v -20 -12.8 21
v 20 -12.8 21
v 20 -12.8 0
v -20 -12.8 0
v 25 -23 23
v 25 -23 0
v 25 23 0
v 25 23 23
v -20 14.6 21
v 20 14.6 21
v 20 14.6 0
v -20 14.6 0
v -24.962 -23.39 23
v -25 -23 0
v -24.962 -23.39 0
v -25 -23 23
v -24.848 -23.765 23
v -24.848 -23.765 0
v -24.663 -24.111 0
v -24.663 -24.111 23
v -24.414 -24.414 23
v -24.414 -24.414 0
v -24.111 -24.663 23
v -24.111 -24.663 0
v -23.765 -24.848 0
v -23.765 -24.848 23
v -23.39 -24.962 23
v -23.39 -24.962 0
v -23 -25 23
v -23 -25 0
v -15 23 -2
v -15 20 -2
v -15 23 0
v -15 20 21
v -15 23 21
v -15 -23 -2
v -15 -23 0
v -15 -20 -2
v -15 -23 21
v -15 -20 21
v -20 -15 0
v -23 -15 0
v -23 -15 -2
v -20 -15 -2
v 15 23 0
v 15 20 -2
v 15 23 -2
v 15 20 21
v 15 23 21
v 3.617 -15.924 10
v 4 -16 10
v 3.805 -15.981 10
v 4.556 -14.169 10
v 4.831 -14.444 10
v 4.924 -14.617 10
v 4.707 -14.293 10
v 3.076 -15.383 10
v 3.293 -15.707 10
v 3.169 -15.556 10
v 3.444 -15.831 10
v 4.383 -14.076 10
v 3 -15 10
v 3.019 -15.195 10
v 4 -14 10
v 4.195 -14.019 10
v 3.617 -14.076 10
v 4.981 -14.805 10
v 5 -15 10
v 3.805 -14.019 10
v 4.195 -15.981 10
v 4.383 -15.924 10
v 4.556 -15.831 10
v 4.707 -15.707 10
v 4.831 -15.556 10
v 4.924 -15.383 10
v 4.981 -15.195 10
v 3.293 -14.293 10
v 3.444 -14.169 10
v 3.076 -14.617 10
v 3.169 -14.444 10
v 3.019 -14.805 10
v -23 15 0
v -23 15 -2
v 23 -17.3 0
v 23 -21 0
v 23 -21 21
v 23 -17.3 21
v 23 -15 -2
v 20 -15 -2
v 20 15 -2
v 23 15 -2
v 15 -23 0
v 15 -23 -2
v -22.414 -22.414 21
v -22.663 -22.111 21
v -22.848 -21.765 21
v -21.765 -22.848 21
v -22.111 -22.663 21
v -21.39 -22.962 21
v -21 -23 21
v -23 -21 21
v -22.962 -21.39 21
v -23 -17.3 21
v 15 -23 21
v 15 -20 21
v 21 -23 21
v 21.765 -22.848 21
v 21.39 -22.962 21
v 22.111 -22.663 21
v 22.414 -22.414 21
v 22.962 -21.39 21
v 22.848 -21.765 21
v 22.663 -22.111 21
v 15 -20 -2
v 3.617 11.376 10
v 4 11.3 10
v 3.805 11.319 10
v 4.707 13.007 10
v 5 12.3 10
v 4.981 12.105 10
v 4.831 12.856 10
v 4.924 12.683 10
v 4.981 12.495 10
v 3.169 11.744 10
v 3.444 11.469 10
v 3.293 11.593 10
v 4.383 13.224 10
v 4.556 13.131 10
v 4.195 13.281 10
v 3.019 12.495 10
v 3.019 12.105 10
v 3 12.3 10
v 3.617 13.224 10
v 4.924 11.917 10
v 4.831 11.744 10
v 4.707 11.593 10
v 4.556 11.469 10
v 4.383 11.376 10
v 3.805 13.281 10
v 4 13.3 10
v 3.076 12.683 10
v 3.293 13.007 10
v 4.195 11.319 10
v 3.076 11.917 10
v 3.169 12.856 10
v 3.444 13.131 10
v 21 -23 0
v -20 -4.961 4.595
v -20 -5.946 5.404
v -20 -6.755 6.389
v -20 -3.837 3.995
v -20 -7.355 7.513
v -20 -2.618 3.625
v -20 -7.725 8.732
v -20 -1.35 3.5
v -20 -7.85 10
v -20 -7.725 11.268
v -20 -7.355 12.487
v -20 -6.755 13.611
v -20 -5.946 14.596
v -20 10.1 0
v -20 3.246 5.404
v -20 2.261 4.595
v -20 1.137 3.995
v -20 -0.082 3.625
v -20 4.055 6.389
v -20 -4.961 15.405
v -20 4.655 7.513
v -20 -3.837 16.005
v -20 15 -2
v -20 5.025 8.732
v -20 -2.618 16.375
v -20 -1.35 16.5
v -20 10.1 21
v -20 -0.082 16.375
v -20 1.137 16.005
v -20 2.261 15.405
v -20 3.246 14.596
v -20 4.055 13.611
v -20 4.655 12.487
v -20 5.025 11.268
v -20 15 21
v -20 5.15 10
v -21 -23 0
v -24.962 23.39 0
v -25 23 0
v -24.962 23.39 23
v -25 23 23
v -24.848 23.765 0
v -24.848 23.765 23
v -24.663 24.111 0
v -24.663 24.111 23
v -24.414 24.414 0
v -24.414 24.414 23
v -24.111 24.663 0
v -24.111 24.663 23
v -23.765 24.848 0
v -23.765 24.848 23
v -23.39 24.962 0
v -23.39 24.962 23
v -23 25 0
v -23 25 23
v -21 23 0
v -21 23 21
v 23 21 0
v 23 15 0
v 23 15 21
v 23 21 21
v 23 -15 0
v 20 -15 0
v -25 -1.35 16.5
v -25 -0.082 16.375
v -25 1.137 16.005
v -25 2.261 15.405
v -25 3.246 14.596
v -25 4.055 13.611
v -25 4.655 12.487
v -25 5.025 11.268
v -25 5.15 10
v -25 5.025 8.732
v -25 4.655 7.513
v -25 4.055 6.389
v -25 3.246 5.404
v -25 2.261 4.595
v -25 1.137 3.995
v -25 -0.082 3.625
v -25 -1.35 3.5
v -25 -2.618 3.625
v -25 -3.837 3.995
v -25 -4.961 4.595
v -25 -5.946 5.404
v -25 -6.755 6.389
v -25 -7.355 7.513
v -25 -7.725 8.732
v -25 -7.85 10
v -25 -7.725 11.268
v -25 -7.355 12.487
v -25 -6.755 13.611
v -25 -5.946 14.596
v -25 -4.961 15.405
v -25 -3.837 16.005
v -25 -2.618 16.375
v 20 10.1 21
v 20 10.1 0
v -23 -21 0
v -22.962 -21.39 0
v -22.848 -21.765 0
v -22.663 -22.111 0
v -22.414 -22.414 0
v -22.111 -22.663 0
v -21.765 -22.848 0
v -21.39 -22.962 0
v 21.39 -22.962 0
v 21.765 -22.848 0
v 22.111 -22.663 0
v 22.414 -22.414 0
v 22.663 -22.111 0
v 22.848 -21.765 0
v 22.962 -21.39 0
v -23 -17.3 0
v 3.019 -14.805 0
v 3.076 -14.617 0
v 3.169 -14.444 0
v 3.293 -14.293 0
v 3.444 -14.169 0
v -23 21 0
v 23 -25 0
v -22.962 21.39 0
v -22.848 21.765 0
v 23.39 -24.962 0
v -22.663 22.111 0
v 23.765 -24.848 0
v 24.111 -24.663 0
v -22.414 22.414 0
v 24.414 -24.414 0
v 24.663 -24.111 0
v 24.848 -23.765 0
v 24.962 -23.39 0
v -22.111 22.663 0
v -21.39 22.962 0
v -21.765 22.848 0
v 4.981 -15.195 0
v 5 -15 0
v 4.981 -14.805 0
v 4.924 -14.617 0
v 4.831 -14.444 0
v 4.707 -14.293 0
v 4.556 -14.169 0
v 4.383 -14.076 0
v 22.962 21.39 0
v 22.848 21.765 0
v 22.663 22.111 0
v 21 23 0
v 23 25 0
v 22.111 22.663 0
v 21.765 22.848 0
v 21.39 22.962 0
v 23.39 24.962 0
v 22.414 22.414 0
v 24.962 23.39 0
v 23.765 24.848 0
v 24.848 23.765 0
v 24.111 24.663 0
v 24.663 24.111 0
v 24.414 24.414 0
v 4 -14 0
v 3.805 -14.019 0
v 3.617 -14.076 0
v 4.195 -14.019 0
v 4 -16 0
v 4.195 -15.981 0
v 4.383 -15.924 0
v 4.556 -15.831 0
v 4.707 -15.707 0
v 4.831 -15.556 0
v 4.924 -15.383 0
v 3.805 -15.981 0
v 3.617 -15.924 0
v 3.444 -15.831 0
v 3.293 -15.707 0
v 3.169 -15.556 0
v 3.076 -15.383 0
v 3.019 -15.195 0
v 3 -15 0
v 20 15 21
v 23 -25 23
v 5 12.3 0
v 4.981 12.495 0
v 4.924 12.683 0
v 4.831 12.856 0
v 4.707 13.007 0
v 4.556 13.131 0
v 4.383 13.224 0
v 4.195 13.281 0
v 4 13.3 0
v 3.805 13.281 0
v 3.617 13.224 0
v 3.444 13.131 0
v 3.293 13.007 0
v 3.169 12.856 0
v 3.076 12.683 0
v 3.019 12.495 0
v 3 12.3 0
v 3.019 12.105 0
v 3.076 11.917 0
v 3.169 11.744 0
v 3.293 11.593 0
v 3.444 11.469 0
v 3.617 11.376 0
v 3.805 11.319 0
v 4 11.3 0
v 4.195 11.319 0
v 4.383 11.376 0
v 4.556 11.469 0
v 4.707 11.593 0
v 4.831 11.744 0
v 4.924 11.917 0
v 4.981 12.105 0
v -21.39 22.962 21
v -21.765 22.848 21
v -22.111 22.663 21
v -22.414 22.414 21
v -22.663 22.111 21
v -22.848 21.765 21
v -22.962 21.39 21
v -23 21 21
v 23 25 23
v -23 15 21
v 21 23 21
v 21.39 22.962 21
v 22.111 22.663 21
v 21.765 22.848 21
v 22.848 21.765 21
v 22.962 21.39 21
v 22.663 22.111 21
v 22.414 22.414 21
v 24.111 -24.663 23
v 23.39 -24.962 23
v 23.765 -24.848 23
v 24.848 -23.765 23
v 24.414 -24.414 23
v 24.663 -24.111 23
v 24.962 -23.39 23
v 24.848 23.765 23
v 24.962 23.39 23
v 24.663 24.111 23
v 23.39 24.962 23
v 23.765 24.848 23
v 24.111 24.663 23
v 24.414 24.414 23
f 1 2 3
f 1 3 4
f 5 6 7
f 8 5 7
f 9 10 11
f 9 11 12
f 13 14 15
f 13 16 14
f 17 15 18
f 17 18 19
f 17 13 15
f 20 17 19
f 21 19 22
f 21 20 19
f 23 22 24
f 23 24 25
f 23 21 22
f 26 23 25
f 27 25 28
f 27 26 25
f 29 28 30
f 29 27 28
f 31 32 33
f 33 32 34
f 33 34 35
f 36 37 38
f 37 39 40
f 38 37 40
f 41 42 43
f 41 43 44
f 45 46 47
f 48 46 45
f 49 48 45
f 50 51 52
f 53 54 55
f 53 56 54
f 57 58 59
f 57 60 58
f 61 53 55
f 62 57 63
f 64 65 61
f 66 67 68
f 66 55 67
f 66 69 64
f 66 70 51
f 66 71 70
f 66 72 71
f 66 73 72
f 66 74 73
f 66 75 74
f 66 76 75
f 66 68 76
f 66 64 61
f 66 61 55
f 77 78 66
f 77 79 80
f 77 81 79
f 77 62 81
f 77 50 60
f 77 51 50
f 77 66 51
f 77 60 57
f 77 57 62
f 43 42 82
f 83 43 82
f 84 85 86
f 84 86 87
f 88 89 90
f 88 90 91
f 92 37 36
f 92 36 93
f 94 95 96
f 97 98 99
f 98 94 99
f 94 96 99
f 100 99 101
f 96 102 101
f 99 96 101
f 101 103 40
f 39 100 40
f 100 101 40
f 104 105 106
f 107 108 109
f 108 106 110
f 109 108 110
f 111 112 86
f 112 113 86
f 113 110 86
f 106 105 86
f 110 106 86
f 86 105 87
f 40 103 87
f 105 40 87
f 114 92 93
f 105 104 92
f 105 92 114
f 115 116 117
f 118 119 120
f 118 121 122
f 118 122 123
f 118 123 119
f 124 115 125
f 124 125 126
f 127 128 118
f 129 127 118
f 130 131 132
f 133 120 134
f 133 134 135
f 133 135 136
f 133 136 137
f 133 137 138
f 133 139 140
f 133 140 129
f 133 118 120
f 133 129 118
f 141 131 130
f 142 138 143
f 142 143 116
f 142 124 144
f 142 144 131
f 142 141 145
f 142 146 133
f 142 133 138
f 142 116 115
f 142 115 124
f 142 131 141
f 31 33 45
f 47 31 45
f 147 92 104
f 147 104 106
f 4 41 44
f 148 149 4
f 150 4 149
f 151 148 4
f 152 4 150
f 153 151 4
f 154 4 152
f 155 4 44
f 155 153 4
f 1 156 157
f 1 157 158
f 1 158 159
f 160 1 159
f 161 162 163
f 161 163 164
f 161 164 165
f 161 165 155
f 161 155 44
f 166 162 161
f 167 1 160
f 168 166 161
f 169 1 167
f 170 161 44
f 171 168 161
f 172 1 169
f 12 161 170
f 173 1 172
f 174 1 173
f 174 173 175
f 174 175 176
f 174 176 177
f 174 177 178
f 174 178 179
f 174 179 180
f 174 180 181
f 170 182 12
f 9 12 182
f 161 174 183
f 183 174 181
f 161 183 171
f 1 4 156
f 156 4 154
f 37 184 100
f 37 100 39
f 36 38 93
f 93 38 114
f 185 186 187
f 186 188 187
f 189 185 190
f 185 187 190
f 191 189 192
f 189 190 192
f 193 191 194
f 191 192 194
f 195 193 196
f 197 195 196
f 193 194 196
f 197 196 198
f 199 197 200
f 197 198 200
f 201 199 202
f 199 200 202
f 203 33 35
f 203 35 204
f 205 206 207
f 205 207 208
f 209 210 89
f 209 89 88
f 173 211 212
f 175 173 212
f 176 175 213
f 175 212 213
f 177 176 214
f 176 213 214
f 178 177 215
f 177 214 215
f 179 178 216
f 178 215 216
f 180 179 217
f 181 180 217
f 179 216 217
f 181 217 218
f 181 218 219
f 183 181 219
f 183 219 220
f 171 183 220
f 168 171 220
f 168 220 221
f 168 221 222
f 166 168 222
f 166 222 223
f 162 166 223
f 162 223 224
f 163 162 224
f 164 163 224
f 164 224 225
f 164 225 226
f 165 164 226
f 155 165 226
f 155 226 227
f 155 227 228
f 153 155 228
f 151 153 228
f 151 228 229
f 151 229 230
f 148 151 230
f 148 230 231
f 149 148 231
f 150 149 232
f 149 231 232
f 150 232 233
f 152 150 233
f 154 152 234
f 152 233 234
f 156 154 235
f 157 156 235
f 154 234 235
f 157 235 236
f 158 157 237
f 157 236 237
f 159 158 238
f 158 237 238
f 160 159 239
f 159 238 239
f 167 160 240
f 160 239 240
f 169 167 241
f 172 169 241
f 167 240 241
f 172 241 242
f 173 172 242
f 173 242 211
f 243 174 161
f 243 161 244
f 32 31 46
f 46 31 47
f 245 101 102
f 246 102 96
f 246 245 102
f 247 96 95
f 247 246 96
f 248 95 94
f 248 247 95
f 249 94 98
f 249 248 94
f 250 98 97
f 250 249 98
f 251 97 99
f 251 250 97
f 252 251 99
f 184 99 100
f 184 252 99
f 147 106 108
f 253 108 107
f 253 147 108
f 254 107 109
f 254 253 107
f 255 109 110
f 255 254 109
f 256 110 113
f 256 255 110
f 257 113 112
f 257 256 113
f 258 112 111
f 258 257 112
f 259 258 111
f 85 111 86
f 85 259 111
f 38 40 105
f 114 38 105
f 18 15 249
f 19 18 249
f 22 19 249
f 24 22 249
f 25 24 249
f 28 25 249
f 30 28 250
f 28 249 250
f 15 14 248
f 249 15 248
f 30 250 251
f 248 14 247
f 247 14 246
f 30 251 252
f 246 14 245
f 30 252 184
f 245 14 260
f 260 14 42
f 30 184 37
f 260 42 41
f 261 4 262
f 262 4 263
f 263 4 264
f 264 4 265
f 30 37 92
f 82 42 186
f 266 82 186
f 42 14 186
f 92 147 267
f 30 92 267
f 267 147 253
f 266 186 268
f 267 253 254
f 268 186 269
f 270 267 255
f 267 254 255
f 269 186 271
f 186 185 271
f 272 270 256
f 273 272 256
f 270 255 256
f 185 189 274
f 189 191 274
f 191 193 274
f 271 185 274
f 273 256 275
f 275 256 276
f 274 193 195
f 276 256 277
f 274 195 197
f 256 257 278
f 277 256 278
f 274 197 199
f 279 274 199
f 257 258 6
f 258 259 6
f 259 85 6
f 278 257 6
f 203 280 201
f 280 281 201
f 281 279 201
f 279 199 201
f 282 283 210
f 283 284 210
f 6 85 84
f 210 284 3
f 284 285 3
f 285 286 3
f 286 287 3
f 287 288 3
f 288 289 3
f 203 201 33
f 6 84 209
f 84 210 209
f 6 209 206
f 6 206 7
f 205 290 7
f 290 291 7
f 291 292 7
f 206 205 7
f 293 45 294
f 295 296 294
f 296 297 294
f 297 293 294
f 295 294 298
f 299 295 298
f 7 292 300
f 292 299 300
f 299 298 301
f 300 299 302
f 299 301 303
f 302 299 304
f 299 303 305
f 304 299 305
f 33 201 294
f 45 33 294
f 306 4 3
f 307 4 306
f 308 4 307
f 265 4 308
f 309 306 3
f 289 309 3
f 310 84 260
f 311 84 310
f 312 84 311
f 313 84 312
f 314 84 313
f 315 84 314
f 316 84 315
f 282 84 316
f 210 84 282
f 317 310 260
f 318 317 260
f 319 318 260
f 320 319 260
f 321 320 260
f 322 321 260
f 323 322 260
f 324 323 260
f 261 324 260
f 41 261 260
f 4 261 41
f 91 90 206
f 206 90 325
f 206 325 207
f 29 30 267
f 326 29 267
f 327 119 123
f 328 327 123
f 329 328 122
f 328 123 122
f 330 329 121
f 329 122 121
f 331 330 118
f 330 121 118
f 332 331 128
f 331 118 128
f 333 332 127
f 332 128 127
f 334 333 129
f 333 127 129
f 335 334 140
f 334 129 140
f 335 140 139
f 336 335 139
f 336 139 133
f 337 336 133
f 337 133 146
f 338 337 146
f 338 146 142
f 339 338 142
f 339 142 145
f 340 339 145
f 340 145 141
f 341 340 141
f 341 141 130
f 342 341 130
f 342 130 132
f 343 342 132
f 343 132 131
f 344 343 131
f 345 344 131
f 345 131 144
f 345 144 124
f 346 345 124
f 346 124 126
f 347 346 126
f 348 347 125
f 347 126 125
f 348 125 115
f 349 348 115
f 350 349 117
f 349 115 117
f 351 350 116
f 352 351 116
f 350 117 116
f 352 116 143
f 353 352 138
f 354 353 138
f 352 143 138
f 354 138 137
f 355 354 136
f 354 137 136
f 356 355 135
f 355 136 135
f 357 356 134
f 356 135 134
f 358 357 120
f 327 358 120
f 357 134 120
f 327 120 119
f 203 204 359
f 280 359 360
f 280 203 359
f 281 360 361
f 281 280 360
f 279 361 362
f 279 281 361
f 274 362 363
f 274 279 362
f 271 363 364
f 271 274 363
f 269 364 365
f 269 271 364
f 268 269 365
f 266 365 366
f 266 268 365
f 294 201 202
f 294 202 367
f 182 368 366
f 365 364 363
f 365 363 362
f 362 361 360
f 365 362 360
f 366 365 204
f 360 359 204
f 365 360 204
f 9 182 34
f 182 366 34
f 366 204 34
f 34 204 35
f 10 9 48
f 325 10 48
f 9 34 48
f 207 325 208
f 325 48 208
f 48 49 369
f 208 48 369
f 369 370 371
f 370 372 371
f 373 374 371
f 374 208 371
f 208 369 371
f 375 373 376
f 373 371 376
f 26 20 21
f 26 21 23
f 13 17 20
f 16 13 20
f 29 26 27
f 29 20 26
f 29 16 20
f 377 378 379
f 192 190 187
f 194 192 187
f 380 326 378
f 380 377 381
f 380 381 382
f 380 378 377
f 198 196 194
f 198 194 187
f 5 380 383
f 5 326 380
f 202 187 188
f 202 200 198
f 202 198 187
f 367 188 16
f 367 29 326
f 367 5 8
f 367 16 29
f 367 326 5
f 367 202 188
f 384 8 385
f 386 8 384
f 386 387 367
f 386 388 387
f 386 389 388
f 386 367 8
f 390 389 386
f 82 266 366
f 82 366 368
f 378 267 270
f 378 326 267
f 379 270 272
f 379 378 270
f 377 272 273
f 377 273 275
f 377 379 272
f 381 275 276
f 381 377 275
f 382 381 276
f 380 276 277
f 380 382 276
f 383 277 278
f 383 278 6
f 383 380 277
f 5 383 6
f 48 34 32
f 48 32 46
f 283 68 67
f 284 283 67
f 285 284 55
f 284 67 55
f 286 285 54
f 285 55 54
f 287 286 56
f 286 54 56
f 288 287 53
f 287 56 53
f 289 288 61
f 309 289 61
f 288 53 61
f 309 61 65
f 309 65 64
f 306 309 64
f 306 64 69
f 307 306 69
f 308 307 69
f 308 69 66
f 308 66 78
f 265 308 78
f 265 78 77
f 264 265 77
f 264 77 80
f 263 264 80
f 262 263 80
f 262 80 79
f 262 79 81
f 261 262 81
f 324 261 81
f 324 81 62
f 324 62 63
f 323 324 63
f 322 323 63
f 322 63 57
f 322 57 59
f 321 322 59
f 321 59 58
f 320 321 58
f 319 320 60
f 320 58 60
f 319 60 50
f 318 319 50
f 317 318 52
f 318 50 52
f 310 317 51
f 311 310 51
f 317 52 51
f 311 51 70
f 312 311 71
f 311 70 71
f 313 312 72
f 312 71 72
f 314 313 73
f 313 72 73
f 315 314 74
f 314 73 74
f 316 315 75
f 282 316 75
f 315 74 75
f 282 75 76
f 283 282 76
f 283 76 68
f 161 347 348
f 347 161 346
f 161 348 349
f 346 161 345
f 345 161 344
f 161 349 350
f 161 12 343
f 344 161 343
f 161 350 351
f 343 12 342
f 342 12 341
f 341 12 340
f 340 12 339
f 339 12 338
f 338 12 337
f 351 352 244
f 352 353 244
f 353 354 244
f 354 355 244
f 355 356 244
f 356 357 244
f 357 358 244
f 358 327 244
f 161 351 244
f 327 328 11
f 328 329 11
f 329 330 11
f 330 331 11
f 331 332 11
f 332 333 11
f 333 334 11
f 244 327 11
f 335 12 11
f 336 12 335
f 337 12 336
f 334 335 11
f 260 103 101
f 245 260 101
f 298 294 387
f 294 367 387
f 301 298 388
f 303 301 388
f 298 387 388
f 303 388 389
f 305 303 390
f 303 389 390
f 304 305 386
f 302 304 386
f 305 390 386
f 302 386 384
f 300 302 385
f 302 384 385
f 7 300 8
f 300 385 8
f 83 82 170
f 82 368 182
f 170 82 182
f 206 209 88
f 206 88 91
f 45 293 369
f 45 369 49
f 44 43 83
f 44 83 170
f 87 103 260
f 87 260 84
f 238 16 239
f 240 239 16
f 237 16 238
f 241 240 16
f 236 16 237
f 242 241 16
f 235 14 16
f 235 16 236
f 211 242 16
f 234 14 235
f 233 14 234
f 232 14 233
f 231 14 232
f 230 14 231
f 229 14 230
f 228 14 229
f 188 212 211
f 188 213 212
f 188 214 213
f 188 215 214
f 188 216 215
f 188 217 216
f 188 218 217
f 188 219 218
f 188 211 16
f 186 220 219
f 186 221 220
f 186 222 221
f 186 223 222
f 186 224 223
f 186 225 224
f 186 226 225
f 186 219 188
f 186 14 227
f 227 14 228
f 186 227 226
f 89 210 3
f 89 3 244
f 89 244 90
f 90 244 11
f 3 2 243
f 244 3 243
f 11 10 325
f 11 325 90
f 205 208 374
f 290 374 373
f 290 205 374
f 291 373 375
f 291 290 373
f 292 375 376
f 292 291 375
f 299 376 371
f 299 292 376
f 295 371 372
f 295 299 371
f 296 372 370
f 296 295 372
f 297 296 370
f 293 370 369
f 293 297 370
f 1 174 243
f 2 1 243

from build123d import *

# Parameters (mm, degrees)
SZKIC1_W                           = 30
SZKIC1_H                           = 3
DODANIE_WYCI_GNI_CIE1_DEPTH        = 23
DODANIE_WYCI_GNI_CIE1_DEPTH_BACK   = 2
SZKIC1_W_2                         = 3
SZKIC1_H_2                         = 30
DODANIE_WYCI_GNI_CIE1_2_DEPTH      = 23
DODANIE_WYCI_GNI_CIE1_2_DEPTH_BACK = 2
DODANIE_WYCI_GNI_CIE1_3_DEPTH      = 23
DODANIE_WYCI_GNI_CIE1_3_DEPTH_BACK = 2
DODANIE_WYCI_GNI_CIE1_4_DEPTH      = 23
DODANIE_WYCI_GNI_CIE1_4_DEPTH_BACK = 2
SZKIC2_W                           = 50
SZKIC2_H                           = 50
DODANIE_WYCI_GNI_CIE2_DEPTH        = 23
SZKIC3_W                           = 11.8
SZKIC3_H                           = 4.5
SZKIC3_R                           = 1
SZKIC3_W_2                         = 10.1
SZKIC3_W_3                         = 18.1
DODANIE_WYCI_GNI_CIE3_DEPTH        = 23
ZAOKR_GLENIE1_R                    = 2
WYTNIJ_WYCI_GNI_CIE1_REACH         = 52
SZKIC4_R                           = 6.5
SZKIC5_W                           = 46
SZKIC5_H                           = 46
DODANIE_WYCI_GNI_CIE4_DEPTH        = 2
DODANIE_WYCI_GNI_CIE5_START        = -10
SZKIC6_R                           = 1.05
SZKIC6_R_2                         = 1
DODANIE_WYCI_GNI_CIE5_DEPTH        = 11


with BuildPart() as part:
    # Szkic1 → Dodanie-wyciągnięcie1 (new body, two sides)
    with BuildSketch(Plane.XY) as dodanie_wyci_gni_cie1_sk:
        with Locations((0, 21.5)):
            Rectangle(SZKIC1_W, SZKIC1_H)
    extrude(amount=DODANIE_WYCI_GNI_CIE1_DEPTH)
    extrude(dodanie_wyci_gni_cie1_sk.sketch, amount=-DODANIE_WYCI_GNI_CIE1_DEPTH_BACK)



with BuildPart() as body_2:
    # Szkic1 → Dodanie-wyci_gni_cie1 2 (new body, two sides)
    with BuildSketch(Plane.XY) as dodanie_wyci_gni_cie1_2_sk:
        with Locations((21.5, 0)):
            Rectangle(SZKIC1_W_2, SZKIC1_H_2)
    extrude(amount=DODANIE_WYCI_GNI_CIE1_2_DEPTH)
    extrude(dodanie_wyci_gni_cie1_2_sk.sketch, amount=-DODANIE_WYCI_GNI_CIE1_2_DEPTH_BACK)


with BuildPart() as body_3:
    # Szkic1 → Dodanie-wyci_gni_cie1 3 (new body, two sides)
    with BuildSketch(Plane.XY) as dodanie_wyci_gni_cie1_3_sk:
        with Locations((0, -21.5)):
            Rectangle(SZKIC1_W, SZKIC1_H)
    extrude(amount=DODANIE_WYCI_GNI_CIE1_3_DEPTH)
    extrude(dodanie_wyci_gni_cie1_3_sk.sketch, amount=-DODANIE_WYCI_GNI_CIE1_3_DEPTH_BACK)


with BuildPart() as body_4:
    # Szkic1 → Dodanie-wyci_gni_cie1 4 (new body, two sides)
    with BuildSketch(Plane.XY) as dodanie_wyci_gni_cie1_4_sk:
        with Locations((-21.5, 0)):
            Rectangle(SZKIC1_W_2, SZKIC1_H_2)
    extrude(amount=DODANIE_WYCI_GNI_CIE1_4_DEPTH)
    extrude(dodanie_wyci_gni_cie1_4_sk.sketch, amount=-DODANIE_WYCI_GNI_CIE1_4_DEPTH_BACK)


with BuildPart() as part_1:
    add(part.part)

    add(body_2.part)  # Dodanie-wyciągnięcie2 merges body 2

    add(body_3.part)  # Dodanie-wyciągnięcie2 merges body 3

    add(body_4.part)  # Dodanie-wyciągnięcie2 merges body 4
    # Szkic2 → Dodanie-wyciągnięcie2 (add)
    with BuildSketch(Plane.XY):
        Rectangle(SZKIC2_W, SZKIC2_H)
        with BuildLine():
            Line((-21, -23), (21, -23))
            ThreePointArc((21, -23), (22.414213562, -22.414213562), (23, -21))
            Line((23, -21), (23, 21))
            ThreePointArc((23, 21), (22.414213562, 22.414213562), (21, 23))
            Line((21, 23), (-21, 23))
            ThreePointArc((-21, 23), (-22.414213562, 22.414213562), (-23, 21))
            Line((-23, 21), (-23, -21))
            ThreePointArc((-23, -21), (-22.414213562, -22.414213562), (-21, -23))
        make_face(mode=Mode.SUBTRACT)
    extrude(amount=DODANIE_WYCI_GNI_CIE2_DEPTH)

    # Szkic3 → Dodanie-wyciągnięcie3 (add)
    with BuildSketch(Plane.XY.offset(23)):
        Polygon((-1.9, -17.3), (-1.9, -12.8), (-20, -12.8), (-20, -15), (-23, -15), (-23, -17.3), align=None)
        with Locations((4, -15.05)):
            Rectangle(SZKIC3_W, SZKIC3_H)
        with Locations((4, -15)):
            Circle(SZKIC3_R, mode=Mode.SUBTRACT)
        Polygon((20, -12.8), (9.9, -12.8), (9.9, -17.3), (23, -17.3), (23, -15), (20, -15), align=None)
        with Locations((14.95, 12.35)):
            Rectangle(SZKIC3_W_2, SZKIC3_H)
        with Locations((4, 12.35)):
            Rectangle(SZKIC3_W, SZKIC3_H)
        with Locations((4, 12.3)):
            Circle(SZKIC3_R, mode=Mode.SUBTRACT)
        with Locations((-10.95, 12.35)):
            Rectangle(SZKIC3_W_3, SZKIC3_H)
    extrude(amount=-DODANIE_WYCI_GNI_CIE3_DEPTH)

    # Zaokrąglenie1
    zaokr_glenie1_edges = [part_1.edges().sort_by_distance(p)[0] for p in [
        (-25, -25, 11.5),
        (-25, 25, 11.5),
        (25, 25, 11.5),
        (25, -25, 11.5),
    ]]
    fillet(zaokr_glenie1_edges, radius=ZAOKR_GLENIE1_R)

    # Szkic4 → Wytnij-wyciągnięcie1 (cut, up to next)
    with BuildSketch(Plane.ZY.offset(25), mode=Mode.PRIVATE) as wytnij_wyci_gni_cie1_sk1:
        with Locations((10, -1.35)):
            Circle(SZKIC4_R)
    wytnij_wyci_gni_cie1_tool1 = extrude(wytnij_wyci_gni_cie1_sk1.sketch, amount=-WYTNIJ_WYCI_GNI_CIE1_REACH, mode=Mode.PRIVATE) & part_1.part
    add(wytnij_wyci_gni_cie1_tool1.solids().sort_by_distance((-25, -1.35, 10))[0], mode=Mode.SUBTRACT)

    # Szkic5 → Dodanie-wyciągnięcie4 (add)
    with BuildSketch(Plane.XY.offset(23)):
        Rectangle(SZKIC5_W, SZKIC5_H)
    extrude(amount=-DODANIE_WYCI_GNI_CIE4_DEPTH)

    # Szkic6 → Dodanie-wyciągnięcie5 (add)
    with BuildSketch(Plane(origin=(0, 0, 0), x_dir=(-1, 0, 0), z_dir=(0, 0, -1)).offset(DODANIE_WYCI_GNI_CIE5_START)):
        with Locations((-4, 12.25)):
            Circle(SZKIC6_R)
        with Locations((-4, -15)):
            Circle(SZKIC6_R_2)
    extrude(amount=-DODANIE_WYCI_GNI_CIE5_DEPTH)


solid = part_1.part
